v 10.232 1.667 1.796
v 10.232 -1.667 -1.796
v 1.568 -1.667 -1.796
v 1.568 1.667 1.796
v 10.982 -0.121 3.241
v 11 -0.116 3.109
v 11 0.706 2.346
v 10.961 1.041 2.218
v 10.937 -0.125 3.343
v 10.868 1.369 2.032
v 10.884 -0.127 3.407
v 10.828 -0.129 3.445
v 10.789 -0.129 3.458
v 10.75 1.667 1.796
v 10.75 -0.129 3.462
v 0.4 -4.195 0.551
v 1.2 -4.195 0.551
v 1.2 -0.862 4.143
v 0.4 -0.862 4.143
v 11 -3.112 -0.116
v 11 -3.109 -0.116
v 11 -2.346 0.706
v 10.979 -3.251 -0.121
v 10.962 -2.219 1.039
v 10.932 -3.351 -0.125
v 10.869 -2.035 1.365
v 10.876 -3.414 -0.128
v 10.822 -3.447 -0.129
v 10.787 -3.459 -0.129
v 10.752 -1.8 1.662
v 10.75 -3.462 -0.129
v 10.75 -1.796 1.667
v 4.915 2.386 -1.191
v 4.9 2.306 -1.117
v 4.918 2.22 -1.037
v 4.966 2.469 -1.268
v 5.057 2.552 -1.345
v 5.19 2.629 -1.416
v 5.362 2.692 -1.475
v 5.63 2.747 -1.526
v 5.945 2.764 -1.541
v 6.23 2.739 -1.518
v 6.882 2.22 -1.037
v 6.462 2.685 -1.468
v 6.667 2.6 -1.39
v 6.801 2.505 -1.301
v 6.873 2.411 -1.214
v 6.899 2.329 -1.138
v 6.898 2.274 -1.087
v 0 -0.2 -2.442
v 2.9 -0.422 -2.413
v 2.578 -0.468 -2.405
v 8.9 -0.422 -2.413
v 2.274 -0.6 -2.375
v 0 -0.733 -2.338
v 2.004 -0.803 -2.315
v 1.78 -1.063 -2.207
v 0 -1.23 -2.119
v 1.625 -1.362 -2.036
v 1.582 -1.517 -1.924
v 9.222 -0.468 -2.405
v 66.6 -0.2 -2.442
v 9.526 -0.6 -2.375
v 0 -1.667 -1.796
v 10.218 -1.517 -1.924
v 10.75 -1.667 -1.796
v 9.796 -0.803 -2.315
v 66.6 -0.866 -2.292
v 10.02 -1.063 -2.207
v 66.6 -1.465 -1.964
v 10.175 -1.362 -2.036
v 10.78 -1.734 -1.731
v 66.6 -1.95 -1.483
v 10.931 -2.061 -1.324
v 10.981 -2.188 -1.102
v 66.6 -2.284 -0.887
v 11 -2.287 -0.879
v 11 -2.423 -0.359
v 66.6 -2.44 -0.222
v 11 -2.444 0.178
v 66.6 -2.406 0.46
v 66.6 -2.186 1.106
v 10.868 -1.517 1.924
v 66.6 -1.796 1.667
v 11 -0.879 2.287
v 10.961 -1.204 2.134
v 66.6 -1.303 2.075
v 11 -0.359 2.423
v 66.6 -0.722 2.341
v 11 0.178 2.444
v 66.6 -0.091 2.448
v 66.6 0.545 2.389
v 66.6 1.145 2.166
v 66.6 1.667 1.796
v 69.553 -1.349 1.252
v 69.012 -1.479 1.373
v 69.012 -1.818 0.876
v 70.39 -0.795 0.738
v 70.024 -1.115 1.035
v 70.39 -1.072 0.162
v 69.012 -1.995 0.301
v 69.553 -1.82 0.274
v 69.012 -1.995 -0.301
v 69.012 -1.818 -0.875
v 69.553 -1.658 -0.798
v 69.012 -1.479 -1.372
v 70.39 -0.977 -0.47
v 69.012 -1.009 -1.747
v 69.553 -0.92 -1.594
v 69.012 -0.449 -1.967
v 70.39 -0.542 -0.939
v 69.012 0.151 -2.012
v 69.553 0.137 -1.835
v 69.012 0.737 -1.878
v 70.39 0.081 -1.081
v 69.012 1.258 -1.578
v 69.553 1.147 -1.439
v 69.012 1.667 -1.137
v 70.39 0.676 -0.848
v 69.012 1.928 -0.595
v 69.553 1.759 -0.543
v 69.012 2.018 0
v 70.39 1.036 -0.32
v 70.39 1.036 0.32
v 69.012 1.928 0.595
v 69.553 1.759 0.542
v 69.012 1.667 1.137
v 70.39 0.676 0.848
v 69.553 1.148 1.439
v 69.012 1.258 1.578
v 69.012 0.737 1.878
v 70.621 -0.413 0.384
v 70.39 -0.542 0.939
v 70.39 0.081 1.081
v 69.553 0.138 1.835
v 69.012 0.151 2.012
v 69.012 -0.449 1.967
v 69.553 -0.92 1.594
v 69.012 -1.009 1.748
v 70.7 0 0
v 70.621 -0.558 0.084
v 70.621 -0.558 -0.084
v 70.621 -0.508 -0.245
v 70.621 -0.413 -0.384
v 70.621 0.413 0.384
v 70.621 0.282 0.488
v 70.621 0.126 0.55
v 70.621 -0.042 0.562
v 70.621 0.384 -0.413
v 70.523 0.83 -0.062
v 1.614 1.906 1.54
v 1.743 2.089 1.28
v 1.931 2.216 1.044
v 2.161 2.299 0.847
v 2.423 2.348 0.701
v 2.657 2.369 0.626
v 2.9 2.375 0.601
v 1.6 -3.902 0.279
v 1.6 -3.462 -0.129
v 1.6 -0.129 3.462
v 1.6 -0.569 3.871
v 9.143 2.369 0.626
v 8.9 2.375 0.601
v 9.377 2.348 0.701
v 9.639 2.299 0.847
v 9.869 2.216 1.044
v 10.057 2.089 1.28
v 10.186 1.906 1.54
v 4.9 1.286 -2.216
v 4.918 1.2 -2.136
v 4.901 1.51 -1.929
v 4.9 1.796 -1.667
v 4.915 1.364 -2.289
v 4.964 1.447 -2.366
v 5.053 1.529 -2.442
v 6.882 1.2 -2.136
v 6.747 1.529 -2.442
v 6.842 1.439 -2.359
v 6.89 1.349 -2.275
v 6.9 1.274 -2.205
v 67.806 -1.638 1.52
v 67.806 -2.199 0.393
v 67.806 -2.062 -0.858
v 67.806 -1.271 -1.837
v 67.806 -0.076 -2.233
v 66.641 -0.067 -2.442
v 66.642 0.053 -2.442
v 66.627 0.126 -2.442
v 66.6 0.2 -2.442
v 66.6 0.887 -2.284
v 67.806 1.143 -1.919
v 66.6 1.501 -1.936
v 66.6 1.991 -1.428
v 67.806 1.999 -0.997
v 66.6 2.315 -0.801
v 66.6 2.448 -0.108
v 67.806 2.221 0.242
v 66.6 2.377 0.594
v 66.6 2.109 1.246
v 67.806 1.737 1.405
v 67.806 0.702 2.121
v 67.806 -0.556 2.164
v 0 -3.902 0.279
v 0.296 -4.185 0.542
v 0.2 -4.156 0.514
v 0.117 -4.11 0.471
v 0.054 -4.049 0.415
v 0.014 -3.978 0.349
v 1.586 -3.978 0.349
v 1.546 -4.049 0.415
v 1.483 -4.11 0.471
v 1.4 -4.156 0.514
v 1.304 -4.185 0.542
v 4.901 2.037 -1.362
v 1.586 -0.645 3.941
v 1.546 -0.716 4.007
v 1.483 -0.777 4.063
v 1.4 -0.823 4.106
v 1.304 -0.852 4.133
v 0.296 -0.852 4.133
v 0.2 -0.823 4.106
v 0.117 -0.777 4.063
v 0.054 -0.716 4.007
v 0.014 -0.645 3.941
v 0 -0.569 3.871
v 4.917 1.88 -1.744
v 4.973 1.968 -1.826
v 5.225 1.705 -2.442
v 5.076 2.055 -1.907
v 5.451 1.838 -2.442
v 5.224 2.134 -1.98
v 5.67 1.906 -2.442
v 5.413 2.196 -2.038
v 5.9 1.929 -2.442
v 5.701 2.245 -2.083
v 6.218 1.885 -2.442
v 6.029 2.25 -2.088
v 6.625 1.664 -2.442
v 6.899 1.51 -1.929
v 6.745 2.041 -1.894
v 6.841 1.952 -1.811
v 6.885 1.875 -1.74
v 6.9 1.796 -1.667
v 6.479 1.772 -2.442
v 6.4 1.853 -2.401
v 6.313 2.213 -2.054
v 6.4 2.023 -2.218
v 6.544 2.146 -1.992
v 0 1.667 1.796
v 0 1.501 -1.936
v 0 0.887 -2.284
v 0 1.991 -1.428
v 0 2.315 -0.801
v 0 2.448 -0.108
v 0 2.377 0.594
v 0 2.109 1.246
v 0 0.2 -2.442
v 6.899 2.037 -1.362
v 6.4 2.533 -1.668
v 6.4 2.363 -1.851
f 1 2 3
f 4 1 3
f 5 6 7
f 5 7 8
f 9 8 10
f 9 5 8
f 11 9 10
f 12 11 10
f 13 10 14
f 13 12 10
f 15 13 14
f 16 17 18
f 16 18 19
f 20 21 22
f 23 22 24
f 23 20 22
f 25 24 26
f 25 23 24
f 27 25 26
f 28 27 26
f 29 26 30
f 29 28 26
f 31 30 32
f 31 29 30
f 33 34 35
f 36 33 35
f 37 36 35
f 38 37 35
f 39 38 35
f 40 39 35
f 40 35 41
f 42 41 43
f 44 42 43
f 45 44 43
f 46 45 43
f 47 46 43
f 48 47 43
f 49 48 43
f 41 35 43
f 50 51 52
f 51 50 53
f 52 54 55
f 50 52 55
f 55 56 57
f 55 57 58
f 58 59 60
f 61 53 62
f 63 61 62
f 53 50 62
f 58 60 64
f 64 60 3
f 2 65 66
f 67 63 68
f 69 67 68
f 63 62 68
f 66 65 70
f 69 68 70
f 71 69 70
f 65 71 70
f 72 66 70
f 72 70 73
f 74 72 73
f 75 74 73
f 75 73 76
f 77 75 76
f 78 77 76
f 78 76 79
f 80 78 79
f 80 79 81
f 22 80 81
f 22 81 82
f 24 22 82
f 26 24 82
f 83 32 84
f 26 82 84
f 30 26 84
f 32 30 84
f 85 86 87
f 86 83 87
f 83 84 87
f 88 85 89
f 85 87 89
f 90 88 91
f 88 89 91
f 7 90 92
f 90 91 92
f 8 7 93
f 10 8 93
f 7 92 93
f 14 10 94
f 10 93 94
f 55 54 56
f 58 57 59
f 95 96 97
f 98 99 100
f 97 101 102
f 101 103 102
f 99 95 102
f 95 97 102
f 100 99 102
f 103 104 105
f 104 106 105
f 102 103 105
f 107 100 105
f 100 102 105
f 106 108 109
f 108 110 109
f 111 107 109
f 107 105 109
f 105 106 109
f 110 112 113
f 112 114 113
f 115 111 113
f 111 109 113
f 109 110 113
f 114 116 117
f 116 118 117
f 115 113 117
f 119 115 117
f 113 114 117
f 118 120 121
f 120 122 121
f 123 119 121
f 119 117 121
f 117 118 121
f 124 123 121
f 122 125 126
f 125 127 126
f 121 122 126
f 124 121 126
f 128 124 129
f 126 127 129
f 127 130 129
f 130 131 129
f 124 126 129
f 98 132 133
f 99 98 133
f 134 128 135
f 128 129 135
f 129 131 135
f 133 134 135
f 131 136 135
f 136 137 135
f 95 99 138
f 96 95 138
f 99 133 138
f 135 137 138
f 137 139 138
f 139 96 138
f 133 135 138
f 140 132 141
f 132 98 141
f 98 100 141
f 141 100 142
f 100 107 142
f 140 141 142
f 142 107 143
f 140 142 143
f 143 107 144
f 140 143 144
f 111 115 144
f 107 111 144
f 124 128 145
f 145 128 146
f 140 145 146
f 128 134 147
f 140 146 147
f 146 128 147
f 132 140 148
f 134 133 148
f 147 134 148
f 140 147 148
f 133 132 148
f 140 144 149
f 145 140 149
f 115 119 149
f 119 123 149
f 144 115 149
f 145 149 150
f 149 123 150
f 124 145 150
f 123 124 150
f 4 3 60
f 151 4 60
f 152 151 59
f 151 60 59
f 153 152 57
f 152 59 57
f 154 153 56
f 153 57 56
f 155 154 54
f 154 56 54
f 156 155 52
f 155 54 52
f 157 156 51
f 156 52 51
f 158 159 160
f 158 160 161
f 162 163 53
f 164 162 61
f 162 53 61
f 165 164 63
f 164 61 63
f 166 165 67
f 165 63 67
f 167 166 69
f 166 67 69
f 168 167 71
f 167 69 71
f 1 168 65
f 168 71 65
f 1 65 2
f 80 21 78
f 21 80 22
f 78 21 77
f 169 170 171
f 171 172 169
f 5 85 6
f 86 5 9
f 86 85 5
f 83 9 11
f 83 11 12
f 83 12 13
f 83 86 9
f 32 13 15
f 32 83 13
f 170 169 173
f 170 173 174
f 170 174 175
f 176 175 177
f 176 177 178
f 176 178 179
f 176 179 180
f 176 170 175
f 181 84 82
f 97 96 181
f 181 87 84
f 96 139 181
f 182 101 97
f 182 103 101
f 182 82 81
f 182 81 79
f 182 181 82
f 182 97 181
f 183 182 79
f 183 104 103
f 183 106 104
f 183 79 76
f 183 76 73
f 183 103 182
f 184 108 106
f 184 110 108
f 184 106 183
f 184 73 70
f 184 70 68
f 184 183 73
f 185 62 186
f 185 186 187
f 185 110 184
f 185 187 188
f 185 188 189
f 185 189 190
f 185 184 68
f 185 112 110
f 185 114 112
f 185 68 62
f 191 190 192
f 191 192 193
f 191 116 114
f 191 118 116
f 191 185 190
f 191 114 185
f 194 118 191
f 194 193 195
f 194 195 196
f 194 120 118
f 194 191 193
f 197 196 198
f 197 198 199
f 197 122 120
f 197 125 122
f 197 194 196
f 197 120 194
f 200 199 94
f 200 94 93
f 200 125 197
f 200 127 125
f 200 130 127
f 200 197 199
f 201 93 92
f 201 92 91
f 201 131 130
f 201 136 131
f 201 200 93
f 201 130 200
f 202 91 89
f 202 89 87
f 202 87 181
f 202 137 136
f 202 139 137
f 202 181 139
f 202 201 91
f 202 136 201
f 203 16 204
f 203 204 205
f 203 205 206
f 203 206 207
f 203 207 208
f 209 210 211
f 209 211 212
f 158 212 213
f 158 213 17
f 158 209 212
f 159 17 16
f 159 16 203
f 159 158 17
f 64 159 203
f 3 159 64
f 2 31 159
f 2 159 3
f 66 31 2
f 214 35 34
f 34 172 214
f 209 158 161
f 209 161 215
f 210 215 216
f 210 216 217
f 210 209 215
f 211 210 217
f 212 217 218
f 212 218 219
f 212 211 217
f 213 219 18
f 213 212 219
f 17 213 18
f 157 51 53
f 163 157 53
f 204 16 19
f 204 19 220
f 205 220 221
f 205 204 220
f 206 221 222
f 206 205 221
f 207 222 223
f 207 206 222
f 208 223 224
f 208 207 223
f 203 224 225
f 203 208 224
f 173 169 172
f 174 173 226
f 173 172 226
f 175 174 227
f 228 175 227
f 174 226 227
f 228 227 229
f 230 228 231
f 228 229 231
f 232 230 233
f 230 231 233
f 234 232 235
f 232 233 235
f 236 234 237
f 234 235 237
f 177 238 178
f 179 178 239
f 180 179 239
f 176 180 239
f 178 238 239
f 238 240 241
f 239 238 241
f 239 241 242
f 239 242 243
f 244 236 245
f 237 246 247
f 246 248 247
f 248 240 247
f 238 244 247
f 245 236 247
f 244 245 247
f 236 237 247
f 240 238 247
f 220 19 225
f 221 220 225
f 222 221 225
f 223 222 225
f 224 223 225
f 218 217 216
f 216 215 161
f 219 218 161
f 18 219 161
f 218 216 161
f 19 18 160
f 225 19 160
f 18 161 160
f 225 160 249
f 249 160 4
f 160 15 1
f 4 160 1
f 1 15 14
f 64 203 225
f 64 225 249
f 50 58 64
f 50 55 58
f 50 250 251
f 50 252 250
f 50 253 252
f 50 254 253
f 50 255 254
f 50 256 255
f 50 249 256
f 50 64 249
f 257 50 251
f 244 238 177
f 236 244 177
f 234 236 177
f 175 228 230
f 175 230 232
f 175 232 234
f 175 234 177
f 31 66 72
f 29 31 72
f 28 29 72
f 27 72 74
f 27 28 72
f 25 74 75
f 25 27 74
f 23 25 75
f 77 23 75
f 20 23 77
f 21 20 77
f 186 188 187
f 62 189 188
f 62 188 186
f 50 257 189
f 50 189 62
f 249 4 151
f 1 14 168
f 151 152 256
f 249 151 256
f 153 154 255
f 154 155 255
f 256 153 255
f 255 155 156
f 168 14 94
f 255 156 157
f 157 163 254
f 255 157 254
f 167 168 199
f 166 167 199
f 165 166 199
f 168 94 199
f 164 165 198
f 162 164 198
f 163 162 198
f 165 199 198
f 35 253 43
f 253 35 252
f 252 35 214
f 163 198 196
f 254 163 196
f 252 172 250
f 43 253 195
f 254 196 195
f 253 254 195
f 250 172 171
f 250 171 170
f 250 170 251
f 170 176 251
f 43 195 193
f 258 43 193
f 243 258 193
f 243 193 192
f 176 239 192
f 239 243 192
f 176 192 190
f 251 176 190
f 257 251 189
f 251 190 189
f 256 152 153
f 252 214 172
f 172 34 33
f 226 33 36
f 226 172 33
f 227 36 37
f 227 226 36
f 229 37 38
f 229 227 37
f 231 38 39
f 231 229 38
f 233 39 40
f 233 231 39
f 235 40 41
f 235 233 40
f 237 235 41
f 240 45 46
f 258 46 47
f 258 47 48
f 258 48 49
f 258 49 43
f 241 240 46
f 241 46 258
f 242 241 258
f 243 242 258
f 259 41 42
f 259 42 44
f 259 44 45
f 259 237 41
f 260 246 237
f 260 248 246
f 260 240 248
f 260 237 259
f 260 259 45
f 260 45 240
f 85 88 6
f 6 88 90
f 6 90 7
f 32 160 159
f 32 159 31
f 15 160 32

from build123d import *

# Parameters (mm, degrees)
SKETCH009_R             = 2.45
PAD005_DEPTH            = 70.7
SKETCH010_W             = 11
SKETCH010_H             = 4.9
PAD006_DEPTH            = 2.45
POCKET003_DEPTH         = 5
POCKET_DEPTH            = 2.45
POCKET004_DEPTH         = 4.901
SKETCH_R                = 2.45
PAD_DEPTH               = 5.25
PAD007_DEPTH            = 4.9
PAD008_DEPTH            = 0.75
PAD008_DEPTH_BACK       = 0.75
POCKET005_DEPTH         = 4.901
POCKET006_DEPTH         = 70.701
BODY001_PLACEMENT_ANGLE = 47.14


with BuildPart() as part:
    # Sketch009 → Pad005 (new body)
    with BuildSketch(Plane.YZ):
        Circle(SKETCH009_R)
    extrude(amount=PAD005_DEPTH)

    # Sketch010 → Pad006 (join)
    with BuildSketch(Plane.XY):
        with Locations((5.5, 0)):
            Rectangle(SKETCH010_W, SKETCH010_H)
    extrude(amount=PAD006_DEPTH)

    # Sketch013 (on Face4 of Pad006) → Pocket003 (cut)
    with BuildSketch(Plane.YZ.offset(11)):
        with BuildLine():
            ThreePointArc((2.45, 0), (0, 2.45), (-2.45, 0))
            Line((-2.45, 0), (2.45, 0))
        make_face()
    extrude(amount=POCKET003_DEPTH, mode=Mode.SUBTRACT)

    # Sketch012 (on Face8 of Pad006) → Pocket (cut)
    with BuildSketch(Plane(origin=(0, 0, 2.45), x_dir=(0, -1, 0), z_dir=(0, 0, 1))):
        with BuildLine():
            ThreePointArc((-2.2, 11), (-2.376777, 10.926777), (-2.45, 10.75))
            Line((-3.45, 10.75), (-2.45, 10.75))
            Line((-3.45, 11), (-3.45, 10.75))
            Line((-2.2, 11), (-3.45, 11))
        make_face()
        with BuildLine():
            Line((2.2, 11), (3.45, 11))
            Line((3.45, 11), (3.45, 10.75))
            Line((3.45, 10.75), (2.45, 10.75))
            ThreePointArc((2.45, 10.75), (2.376776, 10.926777), (2.2, 11))
        make_face()
    extrude(amount=-POCKET_DEPTH, mode=Mode.SUBTRACT)

    # Sketch011 (on Face3 of Pad006) → Pocket004 (cut, through all)
    with BuildSketch(Plane(origin=(0, -2.45, 0), x_dir=(0, 0, -1), z_dir=(0, -1, 0))):
        with BuildLine():
            Line((-2.45, 11), (-2.2, 11))
            ThreePointArc((-2.2, 11), (-2.376777, 10.926777), (-2.45, 10.75))
            Line((-2.45, 11), (-2.45, 10.75))
        make_face()
    extrude(amount=-POCKET004_DEPTH, mode=Mode.SUBTRACT)

    # Sketch (on Face6 of Pocket004) → Pad (join)
    with BuildSketch(Plane(origin=(16, 0, 0), x_dir=(0, 1, 0), z_dir=(-1, 0, 0))):
        Circle(SKETCH_R)
    extrude(amount=PAD_DEPTH)

    # Sketch014 (on Face5 of Pad) → Pad007 (join)
    with BuildSketch(Plane(origin=(0, -2.45, 0), x_dir=(0, 0, -1), z_dir=(0, -1, 0))):
        with BuildLine():
            Line((-2.45, 0), (-2.45, 1.6))
            Line((-2.45, 1.6), (-3.05, 1.6))
            ThreePointArc((-3.05, 1.6), (-3.332843, 1.482843), (-3.45, 1.2))
            Line((-3.45, 1.2), (-3.45, 0.4))
            ThreePointArc((-3.45, 0.4), (-3.332843, 0.117157), (-3.05, 0))
            Line((-3.05, 0), (-2.45, 0))
        make_face()
    extrude(amount=-PAD007_DEPTH)

    # Sketch015 → Pad008 (join, two sides)
    with BuildSketch(Plane.XZ) as pad008_sk:
        with BuildLine():
            add(Edge.make_bspline(
                [(4.9, -2.45), (4.9, -3.532532), (6.4, -2.991266), (7.9, -2.45), (6.4, -1.908734), (4.9, -1.367468), (4.9, -2.45)],
                knots=[0, 0, 0, 2.094395, 2.094395, 4.18879, 4.18879, 6.283185, 6.283185, 6.283185], degree=2, weights=[1, 0.5, 1, 0.5, 1, 0.5, 1]))
        make_face()
    extrude(amount=PAD008_DEPTH)
    extrude(pad008_sk.sketch, amount=-PAD008_DEPTH_BACK)

    # Sketch016 (on Face2 of Pad008) → Pocket005 (cut, through all)
    with BuildSketch(Plane(origin=(0, -2.45, 0), x_dir=(0, 0, -1), z_dir=(0, -1, 0))):
        with BuildLine():
            Line((1.332381, 2.9), (1.332381, 8.9))
            ThreePointArc((1.332381, 8.9), (0.942135, 9.842135), (0, 10.232381))
            Line((0, 10.232381), (0, 1.567619))
            ThreePointArc((0, 1.567619), (0.942135, 1.957865), (1.332381, 2.9))
        make_face()
    extrude(amount=-POCKET005_DEPTH, mode=Mode.SUBTRACT)

    # Sketch017 → Groove (revolve, cut)
    with BuildSketch(Plane.XZ):
        with BuildLine():
            ThreePointArc((70.7, 0), (70.22222, 1.315531), (69.011588, 2.017859))
            Line((66.6, 2.45), (69.011588, 2.017859))
            Line((66.6, 2.45), (70.7, 2.45))
            Line((70.7, 2.45), (72.7, 2.45))
            Line((72.7, 0), (72.7, 2.45))
            Line((70.7, 0), (72.7, 0))
        make_face()
    revolve(axis=Axis((0, 0, 0), (1, 0, 0)), mode=Mode.SUBTRACT)

    # Sketch018 → Pocket006 (cut, through all)
    with BuildSketch(Plane.YZ):
        Polygon((-0.477941, -3.075), (-0.75, -2.78177), (-1.654008, -1.807418), (-1.926067, -1.514188), (-1.926067, -3.075), align=None)
    extrude(amount=POCKET006_DEPTH, mode=Mode.SUBTRACT)


with BuildPart() as part_1:
    # Body001 placement: moved
    add(part.part.rotate(Axis((0, 0, 0), (1, 0, 0)), BODY001_PLACEMENT_ANGLE))


solid = part_1.part
